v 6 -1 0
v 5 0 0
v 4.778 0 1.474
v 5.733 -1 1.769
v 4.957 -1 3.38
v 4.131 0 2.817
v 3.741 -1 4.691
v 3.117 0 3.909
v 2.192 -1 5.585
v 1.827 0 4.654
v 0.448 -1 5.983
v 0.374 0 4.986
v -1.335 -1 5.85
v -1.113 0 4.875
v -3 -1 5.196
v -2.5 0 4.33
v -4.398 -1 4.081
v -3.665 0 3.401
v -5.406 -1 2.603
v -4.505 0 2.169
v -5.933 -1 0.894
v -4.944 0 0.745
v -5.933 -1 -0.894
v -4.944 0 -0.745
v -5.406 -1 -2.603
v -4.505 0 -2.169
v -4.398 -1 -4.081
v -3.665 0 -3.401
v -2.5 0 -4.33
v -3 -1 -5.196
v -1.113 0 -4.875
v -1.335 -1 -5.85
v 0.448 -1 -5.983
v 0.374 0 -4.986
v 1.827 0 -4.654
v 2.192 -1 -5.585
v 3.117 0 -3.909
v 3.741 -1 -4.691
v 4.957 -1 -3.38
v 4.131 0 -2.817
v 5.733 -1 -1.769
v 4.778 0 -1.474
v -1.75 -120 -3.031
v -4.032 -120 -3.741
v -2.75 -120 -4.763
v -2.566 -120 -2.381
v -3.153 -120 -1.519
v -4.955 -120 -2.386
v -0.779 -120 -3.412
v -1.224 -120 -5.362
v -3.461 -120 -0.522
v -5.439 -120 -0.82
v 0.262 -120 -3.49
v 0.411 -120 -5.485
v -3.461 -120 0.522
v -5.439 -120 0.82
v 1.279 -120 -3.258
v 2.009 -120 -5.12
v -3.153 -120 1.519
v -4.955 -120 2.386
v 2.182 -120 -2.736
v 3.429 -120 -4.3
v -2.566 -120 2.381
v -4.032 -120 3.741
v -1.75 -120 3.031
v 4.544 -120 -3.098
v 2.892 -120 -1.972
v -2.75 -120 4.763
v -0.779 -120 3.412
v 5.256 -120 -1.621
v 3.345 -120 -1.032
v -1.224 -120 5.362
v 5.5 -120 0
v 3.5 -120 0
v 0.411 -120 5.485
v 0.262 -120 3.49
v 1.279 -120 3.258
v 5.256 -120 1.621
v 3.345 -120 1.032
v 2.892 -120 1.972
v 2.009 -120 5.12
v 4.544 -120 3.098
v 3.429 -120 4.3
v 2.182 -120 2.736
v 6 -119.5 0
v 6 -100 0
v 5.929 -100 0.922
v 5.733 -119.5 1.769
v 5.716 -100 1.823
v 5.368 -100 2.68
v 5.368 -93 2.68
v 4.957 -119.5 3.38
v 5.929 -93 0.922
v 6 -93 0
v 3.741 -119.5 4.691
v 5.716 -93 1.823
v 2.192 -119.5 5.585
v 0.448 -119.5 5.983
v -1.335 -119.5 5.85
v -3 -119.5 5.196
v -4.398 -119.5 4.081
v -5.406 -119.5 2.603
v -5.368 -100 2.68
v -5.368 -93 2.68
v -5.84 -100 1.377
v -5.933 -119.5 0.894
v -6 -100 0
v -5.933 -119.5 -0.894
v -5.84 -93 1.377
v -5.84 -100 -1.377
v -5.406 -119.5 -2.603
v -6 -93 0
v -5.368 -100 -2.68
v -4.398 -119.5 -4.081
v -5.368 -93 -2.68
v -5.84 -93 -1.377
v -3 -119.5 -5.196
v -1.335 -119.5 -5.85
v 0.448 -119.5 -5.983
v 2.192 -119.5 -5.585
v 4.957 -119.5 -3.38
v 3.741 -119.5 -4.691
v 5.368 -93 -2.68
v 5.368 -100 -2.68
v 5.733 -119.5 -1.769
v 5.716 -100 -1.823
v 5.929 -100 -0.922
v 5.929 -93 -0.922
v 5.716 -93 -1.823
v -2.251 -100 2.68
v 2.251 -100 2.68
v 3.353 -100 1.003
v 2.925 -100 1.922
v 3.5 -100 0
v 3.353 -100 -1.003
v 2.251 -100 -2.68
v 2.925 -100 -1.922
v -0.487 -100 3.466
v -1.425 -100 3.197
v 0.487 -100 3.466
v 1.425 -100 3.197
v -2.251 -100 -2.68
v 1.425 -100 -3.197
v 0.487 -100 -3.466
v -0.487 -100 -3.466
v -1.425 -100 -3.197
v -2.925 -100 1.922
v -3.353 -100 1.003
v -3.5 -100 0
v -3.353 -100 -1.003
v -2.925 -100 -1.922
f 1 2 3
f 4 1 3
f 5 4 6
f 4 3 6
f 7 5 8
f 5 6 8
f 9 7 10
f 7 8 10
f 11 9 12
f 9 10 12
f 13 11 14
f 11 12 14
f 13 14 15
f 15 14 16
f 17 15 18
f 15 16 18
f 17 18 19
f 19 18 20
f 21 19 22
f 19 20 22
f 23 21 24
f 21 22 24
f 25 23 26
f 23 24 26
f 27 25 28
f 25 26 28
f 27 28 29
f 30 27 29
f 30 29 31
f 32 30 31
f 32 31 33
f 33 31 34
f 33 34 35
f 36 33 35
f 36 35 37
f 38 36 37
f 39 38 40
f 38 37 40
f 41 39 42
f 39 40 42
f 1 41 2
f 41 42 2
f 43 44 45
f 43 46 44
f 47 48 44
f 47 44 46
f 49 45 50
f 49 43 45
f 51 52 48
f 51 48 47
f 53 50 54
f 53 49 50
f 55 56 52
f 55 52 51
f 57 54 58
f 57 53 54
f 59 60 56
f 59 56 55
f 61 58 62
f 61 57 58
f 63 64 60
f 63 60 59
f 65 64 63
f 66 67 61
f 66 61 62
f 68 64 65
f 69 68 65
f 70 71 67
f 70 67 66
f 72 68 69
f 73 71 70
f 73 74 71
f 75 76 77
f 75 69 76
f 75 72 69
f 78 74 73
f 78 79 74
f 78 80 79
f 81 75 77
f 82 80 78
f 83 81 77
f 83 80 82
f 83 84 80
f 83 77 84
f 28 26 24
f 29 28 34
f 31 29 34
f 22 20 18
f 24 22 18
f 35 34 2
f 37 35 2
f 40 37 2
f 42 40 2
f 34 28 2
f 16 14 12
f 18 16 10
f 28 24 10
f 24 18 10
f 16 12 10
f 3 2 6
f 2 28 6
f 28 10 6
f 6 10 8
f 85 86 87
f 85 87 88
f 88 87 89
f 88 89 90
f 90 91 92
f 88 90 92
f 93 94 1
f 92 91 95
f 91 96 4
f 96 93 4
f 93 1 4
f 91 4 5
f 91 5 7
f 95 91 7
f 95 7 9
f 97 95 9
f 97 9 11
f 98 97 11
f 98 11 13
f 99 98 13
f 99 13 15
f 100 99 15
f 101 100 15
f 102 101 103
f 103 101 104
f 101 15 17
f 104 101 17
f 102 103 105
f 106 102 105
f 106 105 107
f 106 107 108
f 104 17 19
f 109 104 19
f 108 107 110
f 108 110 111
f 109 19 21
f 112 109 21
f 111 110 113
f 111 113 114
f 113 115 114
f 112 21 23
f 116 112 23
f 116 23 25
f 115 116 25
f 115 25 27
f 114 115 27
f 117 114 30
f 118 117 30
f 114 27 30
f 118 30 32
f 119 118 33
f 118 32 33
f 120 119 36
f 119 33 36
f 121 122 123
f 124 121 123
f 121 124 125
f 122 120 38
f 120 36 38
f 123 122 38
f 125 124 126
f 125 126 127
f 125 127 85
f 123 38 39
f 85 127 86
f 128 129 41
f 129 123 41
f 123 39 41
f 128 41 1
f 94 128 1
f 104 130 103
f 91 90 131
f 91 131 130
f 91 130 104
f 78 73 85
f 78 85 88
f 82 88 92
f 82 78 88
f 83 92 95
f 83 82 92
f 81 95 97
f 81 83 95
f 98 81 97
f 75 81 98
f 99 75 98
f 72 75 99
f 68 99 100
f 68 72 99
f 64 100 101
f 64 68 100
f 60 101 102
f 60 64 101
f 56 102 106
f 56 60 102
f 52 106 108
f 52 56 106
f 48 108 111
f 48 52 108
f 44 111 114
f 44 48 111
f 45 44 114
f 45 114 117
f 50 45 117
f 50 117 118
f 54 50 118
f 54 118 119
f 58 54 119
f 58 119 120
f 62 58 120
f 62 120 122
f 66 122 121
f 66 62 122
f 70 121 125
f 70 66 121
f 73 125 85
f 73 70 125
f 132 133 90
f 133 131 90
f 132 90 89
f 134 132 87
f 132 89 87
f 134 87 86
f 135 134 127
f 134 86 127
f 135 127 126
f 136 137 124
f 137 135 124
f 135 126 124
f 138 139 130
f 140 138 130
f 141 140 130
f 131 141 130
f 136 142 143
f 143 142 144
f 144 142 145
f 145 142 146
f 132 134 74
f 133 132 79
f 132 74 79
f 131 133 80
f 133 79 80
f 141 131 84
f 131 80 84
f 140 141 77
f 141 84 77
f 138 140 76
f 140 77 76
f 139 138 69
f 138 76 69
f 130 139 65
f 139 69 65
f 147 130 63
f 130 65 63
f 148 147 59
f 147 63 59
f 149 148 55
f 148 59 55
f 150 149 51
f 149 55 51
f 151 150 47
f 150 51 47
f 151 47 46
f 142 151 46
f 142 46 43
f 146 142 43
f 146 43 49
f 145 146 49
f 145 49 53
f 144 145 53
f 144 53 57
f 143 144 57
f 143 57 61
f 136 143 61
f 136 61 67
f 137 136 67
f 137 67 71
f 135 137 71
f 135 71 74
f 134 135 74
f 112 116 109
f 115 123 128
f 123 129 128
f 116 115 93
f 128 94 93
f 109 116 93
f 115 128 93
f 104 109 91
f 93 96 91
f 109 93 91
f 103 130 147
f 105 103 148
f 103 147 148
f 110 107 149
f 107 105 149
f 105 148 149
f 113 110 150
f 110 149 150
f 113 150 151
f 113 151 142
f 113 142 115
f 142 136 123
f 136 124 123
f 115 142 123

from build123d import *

# Parameters (mm, degrees)
F0_R     = 6
F1_DEPTH = 120
F2_R     = 3.5
F3_DEPTH = 20
F5_SIZE  = 1
F6_SIZE  = 0.5
F7_W     = 7
F7_H     = 2.68
F8_DEPTH = 12.5


with BuildPart() as f1:
    # F0 (on Front) → F1 (new body)
    with BuildSketch(Plane.XZ):
        Circle(F0_R)
    extrude(amount=F1_DEPTH)

    # F2 (on face) → F3 (cut)
    with BuildSketch(Plane.XZ.offset(120)):
        Circle(F2_R)
    extrude(amount=-F3_DEPTH, mode=Mode.SUBTRACT)

    # F5
    f5_edges = [f1.edges().sort_by_distance(p)[0] for p in [
        (-6, 0, 0),
    ]]
    chamfer(f5_edges, length=F5_SIZE)

    # F6
    f6_edges = [f1.edges().sort_by_distance(p)[0] for p in [
        (-6, -120, 0),
    ]]
    chamfer(f6_edges, length=F6_SIZE)

    # F7 (on Right) → F8 (cut, symmetric)
    with BuildSketch(Plane.YZ):
        with Locations((-96.5, 1.34)):
            Rectangle(F7_W, F7_H)
        with Locations((-96.5, -1.34)):
            Rectangle(F7_W, F7_H)
    extrude(amount=F8_DEPTH, both=True, mode=Mode.SUBTRACT)


solid = f1.part
